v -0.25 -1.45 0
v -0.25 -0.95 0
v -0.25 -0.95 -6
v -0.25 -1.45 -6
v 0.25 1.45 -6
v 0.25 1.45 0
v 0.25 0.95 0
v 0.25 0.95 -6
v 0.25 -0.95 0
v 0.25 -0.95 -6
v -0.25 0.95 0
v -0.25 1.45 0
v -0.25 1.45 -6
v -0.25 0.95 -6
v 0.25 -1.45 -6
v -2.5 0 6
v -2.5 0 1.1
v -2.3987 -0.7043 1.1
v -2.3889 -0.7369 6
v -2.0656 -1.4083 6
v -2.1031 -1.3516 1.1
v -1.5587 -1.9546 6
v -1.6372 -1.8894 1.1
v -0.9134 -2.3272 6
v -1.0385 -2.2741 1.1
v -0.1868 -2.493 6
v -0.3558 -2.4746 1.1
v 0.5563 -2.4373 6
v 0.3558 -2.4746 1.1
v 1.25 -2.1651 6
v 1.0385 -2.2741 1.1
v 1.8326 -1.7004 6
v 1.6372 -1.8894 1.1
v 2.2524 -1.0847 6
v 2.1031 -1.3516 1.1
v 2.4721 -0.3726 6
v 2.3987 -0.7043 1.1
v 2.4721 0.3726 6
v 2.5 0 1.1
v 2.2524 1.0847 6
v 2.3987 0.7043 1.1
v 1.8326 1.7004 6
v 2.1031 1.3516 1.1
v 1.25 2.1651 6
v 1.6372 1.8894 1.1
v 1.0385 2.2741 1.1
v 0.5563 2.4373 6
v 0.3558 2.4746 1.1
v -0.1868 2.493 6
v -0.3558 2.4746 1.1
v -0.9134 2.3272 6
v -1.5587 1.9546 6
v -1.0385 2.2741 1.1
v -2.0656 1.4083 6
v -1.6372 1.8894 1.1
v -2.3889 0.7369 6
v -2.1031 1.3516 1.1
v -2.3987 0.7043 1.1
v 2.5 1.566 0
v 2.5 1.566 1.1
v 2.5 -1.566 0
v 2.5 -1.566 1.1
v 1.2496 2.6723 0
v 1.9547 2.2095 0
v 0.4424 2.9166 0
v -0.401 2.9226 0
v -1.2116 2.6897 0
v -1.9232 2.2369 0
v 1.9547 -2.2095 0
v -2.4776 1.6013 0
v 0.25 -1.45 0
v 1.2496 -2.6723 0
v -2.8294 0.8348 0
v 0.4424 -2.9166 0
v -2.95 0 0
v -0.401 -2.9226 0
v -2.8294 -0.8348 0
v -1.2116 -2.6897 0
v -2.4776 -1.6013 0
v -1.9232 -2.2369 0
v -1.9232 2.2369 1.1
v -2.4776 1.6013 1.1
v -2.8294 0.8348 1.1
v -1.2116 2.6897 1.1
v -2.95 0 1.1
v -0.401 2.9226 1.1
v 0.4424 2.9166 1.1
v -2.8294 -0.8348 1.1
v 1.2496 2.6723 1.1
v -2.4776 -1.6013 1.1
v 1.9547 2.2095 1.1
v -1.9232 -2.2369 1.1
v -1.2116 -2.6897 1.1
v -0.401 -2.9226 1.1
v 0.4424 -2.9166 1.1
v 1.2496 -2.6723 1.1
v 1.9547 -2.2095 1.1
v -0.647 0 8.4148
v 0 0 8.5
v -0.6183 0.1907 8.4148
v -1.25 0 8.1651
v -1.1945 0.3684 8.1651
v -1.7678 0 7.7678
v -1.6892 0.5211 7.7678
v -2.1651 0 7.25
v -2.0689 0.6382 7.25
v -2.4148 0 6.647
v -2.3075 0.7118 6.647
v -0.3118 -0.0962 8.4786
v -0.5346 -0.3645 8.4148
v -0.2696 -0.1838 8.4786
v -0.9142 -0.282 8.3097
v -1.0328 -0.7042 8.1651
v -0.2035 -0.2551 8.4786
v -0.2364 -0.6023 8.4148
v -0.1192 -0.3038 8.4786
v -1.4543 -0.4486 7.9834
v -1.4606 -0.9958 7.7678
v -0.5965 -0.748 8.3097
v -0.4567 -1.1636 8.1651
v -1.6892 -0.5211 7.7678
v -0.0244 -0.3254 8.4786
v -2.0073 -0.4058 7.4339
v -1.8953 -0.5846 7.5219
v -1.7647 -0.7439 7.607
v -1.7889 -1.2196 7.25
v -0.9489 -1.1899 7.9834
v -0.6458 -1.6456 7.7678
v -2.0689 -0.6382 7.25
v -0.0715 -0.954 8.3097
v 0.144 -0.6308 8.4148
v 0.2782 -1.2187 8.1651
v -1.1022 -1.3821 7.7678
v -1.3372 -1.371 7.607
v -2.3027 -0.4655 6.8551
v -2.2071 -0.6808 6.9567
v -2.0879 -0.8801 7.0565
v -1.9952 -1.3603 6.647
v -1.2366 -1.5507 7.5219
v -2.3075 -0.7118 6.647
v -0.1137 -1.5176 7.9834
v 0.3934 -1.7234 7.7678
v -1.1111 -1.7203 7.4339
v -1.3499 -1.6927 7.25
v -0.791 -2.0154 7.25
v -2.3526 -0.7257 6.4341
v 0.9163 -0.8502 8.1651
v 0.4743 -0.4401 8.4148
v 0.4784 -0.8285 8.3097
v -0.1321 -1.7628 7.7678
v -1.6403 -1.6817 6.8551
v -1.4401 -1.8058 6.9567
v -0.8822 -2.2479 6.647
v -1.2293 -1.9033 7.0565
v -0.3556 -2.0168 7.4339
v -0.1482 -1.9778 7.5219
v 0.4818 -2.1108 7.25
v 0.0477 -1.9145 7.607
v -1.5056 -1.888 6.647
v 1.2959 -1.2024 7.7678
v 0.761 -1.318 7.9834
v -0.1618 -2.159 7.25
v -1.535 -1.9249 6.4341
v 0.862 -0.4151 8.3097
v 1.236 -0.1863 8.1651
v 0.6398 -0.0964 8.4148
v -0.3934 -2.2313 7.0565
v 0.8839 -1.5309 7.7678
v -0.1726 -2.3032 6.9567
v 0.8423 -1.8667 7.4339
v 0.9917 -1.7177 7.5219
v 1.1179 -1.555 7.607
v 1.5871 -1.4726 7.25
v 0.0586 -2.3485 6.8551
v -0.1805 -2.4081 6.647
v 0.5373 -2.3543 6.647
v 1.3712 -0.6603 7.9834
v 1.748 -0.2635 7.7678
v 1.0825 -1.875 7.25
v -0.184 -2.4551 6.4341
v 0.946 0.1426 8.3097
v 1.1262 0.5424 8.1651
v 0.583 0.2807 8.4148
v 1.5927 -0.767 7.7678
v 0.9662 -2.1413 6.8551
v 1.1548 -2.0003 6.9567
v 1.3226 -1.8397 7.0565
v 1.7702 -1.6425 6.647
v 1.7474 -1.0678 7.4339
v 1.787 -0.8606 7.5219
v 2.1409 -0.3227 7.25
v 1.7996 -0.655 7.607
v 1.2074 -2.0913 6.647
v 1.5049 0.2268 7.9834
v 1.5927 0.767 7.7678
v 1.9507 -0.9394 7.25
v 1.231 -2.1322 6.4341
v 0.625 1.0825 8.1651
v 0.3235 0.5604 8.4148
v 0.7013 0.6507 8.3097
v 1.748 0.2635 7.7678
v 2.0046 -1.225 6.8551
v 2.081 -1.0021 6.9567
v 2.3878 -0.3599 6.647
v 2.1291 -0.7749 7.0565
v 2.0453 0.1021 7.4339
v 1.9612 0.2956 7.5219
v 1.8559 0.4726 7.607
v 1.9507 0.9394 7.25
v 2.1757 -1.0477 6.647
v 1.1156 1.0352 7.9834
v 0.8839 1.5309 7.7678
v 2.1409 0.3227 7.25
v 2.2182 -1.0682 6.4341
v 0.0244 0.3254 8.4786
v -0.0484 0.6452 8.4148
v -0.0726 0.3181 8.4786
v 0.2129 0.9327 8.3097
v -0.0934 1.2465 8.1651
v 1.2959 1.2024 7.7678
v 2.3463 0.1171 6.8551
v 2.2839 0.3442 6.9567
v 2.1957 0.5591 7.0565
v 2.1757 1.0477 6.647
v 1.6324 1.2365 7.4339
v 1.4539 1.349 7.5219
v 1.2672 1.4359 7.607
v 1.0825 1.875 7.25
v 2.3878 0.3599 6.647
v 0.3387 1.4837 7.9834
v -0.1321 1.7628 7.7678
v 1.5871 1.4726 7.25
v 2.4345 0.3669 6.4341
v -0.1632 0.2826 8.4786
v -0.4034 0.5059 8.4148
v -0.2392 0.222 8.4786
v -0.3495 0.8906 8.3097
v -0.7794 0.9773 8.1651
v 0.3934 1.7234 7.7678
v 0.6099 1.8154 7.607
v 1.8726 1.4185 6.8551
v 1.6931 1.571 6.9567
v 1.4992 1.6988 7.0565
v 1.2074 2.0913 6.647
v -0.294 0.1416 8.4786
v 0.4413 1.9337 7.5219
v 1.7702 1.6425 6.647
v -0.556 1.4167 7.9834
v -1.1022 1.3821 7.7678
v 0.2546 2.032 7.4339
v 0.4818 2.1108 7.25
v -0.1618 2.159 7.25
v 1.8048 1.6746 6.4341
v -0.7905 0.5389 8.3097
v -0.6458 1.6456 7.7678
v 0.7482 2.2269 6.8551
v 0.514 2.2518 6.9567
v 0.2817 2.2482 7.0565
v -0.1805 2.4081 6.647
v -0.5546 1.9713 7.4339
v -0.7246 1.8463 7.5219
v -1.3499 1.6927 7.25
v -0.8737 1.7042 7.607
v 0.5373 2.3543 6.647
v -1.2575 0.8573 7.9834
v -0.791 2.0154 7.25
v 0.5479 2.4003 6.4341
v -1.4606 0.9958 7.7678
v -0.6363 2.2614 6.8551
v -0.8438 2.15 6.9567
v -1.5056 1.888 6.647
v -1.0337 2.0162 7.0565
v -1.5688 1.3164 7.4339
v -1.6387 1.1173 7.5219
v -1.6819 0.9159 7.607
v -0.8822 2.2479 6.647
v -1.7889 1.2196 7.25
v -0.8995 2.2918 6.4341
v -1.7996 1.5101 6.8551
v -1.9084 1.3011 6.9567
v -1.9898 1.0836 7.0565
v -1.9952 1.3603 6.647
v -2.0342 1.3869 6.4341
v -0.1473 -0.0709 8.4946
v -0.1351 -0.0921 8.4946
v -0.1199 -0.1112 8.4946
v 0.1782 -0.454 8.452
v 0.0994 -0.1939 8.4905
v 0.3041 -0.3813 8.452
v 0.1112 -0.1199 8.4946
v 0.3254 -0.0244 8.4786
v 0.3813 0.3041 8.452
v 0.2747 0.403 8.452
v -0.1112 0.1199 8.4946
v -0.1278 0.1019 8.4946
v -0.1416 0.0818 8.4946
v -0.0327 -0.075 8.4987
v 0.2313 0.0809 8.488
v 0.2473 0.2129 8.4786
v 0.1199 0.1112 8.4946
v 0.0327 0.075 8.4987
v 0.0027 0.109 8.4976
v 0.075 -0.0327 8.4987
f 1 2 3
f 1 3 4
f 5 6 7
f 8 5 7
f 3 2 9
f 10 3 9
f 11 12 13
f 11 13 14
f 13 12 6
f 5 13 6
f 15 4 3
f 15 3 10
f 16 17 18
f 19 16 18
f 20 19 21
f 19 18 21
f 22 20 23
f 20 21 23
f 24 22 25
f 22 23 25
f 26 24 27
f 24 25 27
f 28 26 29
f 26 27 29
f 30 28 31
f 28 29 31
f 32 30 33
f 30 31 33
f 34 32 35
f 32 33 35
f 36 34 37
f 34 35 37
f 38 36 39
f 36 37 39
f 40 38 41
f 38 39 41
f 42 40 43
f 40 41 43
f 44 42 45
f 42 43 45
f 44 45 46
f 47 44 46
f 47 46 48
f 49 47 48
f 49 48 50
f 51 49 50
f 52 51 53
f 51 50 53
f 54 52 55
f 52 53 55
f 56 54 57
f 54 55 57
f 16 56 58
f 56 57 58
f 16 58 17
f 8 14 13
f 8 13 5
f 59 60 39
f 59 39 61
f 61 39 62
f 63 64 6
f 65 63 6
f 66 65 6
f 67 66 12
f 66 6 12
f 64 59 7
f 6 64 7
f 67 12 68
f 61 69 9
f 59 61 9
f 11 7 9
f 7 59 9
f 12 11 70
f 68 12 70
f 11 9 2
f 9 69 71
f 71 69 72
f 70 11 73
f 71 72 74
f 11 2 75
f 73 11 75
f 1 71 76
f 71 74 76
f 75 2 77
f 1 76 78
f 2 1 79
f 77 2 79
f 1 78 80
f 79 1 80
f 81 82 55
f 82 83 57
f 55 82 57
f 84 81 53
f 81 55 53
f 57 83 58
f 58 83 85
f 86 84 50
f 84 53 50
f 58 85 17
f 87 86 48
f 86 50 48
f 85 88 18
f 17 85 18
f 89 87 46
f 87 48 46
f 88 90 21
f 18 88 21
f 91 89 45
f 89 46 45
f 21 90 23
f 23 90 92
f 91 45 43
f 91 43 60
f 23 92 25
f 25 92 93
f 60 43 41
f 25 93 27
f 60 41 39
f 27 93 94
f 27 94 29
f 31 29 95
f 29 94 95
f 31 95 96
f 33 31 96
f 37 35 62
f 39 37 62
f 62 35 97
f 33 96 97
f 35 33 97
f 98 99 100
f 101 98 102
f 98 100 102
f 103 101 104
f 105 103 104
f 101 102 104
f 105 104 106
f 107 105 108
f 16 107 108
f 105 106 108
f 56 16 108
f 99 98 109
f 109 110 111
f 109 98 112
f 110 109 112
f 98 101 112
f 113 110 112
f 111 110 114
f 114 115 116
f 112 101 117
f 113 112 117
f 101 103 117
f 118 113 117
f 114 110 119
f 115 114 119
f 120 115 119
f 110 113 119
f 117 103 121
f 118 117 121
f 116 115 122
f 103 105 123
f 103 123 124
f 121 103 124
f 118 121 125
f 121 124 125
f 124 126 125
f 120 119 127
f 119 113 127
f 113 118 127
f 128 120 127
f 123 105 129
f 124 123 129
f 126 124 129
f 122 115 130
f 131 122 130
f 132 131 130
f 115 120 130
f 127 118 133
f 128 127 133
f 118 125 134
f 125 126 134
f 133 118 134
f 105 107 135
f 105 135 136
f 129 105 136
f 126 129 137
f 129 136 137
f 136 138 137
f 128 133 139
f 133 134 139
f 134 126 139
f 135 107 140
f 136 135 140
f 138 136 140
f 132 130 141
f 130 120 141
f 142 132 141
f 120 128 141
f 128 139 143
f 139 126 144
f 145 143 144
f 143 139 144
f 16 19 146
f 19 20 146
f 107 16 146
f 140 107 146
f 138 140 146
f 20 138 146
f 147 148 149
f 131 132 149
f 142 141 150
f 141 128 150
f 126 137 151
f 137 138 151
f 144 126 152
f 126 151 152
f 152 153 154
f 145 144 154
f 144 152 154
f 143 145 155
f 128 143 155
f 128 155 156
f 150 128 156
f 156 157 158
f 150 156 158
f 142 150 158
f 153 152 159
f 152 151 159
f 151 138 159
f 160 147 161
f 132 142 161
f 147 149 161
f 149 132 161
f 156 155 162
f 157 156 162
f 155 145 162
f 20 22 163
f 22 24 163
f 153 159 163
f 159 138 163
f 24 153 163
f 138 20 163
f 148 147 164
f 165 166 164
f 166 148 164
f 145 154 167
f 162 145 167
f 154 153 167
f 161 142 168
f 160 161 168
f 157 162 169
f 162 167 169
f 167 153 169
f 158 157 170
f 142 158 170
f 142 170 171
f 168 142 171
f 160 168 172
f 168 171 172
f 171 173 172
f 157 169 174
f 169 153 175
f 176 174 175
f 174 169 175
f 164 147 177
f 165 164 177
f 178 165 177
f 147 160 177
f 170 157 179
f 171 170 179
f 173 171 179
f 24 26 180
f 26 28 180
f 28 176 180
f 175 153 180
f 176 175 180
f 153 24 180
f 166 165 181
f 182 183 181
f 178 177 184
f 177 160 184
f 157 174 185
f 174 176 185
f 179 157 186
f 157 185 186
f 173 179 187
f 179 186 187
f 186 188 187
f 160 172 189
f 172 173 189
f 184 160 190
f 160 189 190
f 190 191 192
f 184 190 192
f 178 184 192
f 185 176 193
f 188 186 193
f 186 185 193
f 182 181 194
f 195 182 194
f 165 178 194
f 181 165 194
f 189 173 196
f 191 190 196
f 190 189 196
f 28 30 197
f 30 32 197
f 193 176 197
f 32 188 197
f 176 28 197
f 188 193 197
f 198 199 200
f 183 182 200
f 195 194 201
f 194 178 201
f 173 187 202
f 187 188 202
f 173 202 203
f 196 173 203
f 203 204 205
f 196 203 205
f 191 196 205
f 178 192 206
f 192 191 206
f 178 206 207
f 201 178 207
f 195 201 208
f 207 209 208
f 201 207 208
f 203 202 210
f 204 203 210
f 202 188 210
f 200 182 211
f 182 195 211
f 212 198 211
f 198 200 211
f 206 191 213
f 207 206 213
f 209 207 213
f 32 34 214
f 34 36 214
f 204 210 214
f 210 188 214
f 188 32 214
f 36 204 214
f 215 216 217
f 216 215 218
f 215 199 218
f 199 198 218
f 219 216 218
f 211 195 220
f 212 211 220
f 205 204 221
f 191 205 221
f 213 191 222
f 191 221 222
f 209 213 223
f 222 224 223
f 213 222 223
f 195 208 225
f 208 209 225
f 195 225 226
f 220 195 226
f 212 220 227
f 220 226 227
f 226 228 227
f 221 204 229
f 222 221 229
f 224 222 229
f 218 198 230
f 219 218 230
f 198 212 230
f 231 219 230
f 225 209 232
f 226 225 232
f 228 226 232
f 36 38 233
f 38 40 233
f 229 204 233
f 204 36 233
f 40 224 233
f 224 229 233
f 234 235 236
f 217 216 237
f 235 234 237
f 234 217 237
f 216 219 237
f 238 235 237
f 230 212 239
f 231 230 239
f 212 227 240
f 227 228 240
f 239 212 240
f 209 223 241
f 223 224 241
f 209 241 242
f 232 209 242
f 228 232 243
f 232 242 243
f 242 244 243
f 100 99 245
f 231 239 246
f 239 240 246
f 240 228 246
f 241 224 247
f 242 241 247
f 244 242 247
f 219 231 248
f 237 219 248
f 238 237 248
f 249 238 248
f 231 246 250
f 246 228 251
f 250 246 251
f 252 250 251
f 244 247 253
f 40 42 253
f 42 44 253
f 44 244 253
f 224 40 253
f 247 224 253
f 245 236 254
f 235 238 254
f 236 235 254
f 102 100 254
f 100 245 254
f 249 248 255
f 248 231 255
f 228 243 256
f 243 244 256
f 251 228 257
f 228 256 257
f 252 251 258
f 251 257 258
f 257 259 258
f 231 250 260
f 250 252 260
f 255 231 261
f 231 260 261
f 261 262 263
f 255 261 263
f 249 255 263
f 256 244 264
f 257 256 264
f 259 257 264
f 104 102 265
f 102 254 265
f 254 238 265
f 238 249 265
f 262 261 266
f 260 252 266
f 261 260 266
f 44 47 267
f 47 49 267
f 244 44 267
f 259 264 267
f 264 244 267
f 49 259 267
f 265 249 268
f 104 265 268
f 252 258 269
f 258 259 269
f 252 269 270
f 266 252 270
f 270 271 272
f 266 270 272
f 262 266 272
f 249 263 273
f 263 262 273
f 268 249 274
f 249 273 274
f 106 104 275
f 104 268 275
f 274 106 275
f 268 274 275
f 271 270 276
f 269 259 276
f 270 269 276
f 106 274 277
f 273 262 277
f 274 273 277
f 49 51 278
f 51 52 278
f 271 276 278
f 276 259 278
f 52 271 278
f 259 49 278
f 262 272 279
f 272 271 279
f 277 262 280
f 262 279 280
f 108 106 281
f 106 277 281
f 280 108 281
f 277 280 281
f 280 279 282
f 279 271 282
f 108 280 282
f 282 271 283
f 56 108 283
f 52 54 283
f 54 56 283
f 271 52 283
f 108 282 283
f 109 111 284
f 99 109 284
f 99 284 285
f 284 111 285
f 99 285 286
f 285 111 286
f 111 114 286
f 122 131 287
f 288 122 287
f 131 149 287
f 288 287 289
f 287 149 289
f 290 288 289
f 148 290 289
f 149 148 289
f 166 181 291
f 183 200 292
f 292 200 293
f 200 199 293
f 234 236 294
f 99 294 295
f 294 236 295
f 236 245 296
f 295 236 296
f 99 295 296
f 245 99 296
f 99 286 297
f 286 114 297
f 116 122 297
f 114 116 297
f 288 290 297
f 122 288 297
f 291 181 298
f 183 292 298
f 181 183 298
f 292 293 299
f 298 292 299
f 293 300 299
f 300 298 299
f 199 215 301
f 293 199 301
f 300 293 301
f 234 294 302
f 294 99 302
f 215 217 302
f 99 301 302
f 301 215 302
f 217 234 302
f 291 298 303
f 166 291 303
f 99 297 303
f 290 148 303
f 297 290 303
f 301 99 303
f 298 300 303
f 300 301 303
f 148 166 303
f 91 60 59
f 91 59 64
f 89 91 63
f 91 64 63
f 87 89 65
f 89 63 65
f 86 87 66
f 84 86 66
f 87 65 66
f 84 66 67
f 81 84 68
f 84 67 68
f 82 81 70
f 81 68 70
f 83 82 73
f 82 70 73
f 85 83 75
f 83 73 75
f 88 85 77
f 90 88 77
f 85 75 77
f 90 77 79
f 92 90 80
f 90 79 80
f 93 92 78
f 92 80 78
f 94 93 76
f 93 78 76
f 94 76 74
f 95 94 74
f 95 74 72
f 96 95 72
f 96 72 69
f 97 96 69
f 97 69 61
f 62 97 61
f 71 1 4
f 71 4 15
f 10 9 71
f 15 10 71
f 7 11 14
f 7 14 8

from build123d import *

# Parameters (mm, degrees)
F3_DEPTH = 1.1
F4_W     = 0.5
F4_H     = 0.5
F5_DEPTH = 6


with BuildPart() as f1:
    # F0 (on Front) → F1 (revolve)
    with BuildSketch(Plane.XZ):
        with BuildLine():
            Line((0, 0), (0, 8.5))
            ThreePointArc((0, 8.5), (-1.767767, 7.767767), (-2.5, 6))
            Line((-2.5, 6), (-2.5, 1.1))
            Line((-2.5, 1.1), (-2.95, 1.1))
            Line((-2.95, 1.1), (-2.95, 0))
            Line((-2.95, 0), (0, 0))
        make_face()
    revolve(axis=Axis((0, 0, 11.292809), (0, 0, 1)))

    # F2 (on face) → F3 (cut, through all)
    with BuildSketch(Plane.XY.offset(1.1)):
        with BuildLine():
            Line((2.5, 1.566046), (2.5, -1.566046))
            ThreePointArc((2.5, -1.566046), (2.95, 0), (2.5, 1.566046))
        make_face()
    extrude(amount=-F3_DEPTH, mode=Mode.SUBTRACT)

    # F4 (on face) → F5 (join)
    with BuildSketch(Plane(origin=(0, 0, 0), x_dir=(1, 0, 0), z_dir=(0, 0, -1))):
        with Locations((0, 1.2)):
            Rectangle(F4_W, F4_H)
        with Locations((0, -1.2)):
            Rectangle(F4_W, F4_H)
    extrude(amount=F5_DEPTH)


solid = f1.part
